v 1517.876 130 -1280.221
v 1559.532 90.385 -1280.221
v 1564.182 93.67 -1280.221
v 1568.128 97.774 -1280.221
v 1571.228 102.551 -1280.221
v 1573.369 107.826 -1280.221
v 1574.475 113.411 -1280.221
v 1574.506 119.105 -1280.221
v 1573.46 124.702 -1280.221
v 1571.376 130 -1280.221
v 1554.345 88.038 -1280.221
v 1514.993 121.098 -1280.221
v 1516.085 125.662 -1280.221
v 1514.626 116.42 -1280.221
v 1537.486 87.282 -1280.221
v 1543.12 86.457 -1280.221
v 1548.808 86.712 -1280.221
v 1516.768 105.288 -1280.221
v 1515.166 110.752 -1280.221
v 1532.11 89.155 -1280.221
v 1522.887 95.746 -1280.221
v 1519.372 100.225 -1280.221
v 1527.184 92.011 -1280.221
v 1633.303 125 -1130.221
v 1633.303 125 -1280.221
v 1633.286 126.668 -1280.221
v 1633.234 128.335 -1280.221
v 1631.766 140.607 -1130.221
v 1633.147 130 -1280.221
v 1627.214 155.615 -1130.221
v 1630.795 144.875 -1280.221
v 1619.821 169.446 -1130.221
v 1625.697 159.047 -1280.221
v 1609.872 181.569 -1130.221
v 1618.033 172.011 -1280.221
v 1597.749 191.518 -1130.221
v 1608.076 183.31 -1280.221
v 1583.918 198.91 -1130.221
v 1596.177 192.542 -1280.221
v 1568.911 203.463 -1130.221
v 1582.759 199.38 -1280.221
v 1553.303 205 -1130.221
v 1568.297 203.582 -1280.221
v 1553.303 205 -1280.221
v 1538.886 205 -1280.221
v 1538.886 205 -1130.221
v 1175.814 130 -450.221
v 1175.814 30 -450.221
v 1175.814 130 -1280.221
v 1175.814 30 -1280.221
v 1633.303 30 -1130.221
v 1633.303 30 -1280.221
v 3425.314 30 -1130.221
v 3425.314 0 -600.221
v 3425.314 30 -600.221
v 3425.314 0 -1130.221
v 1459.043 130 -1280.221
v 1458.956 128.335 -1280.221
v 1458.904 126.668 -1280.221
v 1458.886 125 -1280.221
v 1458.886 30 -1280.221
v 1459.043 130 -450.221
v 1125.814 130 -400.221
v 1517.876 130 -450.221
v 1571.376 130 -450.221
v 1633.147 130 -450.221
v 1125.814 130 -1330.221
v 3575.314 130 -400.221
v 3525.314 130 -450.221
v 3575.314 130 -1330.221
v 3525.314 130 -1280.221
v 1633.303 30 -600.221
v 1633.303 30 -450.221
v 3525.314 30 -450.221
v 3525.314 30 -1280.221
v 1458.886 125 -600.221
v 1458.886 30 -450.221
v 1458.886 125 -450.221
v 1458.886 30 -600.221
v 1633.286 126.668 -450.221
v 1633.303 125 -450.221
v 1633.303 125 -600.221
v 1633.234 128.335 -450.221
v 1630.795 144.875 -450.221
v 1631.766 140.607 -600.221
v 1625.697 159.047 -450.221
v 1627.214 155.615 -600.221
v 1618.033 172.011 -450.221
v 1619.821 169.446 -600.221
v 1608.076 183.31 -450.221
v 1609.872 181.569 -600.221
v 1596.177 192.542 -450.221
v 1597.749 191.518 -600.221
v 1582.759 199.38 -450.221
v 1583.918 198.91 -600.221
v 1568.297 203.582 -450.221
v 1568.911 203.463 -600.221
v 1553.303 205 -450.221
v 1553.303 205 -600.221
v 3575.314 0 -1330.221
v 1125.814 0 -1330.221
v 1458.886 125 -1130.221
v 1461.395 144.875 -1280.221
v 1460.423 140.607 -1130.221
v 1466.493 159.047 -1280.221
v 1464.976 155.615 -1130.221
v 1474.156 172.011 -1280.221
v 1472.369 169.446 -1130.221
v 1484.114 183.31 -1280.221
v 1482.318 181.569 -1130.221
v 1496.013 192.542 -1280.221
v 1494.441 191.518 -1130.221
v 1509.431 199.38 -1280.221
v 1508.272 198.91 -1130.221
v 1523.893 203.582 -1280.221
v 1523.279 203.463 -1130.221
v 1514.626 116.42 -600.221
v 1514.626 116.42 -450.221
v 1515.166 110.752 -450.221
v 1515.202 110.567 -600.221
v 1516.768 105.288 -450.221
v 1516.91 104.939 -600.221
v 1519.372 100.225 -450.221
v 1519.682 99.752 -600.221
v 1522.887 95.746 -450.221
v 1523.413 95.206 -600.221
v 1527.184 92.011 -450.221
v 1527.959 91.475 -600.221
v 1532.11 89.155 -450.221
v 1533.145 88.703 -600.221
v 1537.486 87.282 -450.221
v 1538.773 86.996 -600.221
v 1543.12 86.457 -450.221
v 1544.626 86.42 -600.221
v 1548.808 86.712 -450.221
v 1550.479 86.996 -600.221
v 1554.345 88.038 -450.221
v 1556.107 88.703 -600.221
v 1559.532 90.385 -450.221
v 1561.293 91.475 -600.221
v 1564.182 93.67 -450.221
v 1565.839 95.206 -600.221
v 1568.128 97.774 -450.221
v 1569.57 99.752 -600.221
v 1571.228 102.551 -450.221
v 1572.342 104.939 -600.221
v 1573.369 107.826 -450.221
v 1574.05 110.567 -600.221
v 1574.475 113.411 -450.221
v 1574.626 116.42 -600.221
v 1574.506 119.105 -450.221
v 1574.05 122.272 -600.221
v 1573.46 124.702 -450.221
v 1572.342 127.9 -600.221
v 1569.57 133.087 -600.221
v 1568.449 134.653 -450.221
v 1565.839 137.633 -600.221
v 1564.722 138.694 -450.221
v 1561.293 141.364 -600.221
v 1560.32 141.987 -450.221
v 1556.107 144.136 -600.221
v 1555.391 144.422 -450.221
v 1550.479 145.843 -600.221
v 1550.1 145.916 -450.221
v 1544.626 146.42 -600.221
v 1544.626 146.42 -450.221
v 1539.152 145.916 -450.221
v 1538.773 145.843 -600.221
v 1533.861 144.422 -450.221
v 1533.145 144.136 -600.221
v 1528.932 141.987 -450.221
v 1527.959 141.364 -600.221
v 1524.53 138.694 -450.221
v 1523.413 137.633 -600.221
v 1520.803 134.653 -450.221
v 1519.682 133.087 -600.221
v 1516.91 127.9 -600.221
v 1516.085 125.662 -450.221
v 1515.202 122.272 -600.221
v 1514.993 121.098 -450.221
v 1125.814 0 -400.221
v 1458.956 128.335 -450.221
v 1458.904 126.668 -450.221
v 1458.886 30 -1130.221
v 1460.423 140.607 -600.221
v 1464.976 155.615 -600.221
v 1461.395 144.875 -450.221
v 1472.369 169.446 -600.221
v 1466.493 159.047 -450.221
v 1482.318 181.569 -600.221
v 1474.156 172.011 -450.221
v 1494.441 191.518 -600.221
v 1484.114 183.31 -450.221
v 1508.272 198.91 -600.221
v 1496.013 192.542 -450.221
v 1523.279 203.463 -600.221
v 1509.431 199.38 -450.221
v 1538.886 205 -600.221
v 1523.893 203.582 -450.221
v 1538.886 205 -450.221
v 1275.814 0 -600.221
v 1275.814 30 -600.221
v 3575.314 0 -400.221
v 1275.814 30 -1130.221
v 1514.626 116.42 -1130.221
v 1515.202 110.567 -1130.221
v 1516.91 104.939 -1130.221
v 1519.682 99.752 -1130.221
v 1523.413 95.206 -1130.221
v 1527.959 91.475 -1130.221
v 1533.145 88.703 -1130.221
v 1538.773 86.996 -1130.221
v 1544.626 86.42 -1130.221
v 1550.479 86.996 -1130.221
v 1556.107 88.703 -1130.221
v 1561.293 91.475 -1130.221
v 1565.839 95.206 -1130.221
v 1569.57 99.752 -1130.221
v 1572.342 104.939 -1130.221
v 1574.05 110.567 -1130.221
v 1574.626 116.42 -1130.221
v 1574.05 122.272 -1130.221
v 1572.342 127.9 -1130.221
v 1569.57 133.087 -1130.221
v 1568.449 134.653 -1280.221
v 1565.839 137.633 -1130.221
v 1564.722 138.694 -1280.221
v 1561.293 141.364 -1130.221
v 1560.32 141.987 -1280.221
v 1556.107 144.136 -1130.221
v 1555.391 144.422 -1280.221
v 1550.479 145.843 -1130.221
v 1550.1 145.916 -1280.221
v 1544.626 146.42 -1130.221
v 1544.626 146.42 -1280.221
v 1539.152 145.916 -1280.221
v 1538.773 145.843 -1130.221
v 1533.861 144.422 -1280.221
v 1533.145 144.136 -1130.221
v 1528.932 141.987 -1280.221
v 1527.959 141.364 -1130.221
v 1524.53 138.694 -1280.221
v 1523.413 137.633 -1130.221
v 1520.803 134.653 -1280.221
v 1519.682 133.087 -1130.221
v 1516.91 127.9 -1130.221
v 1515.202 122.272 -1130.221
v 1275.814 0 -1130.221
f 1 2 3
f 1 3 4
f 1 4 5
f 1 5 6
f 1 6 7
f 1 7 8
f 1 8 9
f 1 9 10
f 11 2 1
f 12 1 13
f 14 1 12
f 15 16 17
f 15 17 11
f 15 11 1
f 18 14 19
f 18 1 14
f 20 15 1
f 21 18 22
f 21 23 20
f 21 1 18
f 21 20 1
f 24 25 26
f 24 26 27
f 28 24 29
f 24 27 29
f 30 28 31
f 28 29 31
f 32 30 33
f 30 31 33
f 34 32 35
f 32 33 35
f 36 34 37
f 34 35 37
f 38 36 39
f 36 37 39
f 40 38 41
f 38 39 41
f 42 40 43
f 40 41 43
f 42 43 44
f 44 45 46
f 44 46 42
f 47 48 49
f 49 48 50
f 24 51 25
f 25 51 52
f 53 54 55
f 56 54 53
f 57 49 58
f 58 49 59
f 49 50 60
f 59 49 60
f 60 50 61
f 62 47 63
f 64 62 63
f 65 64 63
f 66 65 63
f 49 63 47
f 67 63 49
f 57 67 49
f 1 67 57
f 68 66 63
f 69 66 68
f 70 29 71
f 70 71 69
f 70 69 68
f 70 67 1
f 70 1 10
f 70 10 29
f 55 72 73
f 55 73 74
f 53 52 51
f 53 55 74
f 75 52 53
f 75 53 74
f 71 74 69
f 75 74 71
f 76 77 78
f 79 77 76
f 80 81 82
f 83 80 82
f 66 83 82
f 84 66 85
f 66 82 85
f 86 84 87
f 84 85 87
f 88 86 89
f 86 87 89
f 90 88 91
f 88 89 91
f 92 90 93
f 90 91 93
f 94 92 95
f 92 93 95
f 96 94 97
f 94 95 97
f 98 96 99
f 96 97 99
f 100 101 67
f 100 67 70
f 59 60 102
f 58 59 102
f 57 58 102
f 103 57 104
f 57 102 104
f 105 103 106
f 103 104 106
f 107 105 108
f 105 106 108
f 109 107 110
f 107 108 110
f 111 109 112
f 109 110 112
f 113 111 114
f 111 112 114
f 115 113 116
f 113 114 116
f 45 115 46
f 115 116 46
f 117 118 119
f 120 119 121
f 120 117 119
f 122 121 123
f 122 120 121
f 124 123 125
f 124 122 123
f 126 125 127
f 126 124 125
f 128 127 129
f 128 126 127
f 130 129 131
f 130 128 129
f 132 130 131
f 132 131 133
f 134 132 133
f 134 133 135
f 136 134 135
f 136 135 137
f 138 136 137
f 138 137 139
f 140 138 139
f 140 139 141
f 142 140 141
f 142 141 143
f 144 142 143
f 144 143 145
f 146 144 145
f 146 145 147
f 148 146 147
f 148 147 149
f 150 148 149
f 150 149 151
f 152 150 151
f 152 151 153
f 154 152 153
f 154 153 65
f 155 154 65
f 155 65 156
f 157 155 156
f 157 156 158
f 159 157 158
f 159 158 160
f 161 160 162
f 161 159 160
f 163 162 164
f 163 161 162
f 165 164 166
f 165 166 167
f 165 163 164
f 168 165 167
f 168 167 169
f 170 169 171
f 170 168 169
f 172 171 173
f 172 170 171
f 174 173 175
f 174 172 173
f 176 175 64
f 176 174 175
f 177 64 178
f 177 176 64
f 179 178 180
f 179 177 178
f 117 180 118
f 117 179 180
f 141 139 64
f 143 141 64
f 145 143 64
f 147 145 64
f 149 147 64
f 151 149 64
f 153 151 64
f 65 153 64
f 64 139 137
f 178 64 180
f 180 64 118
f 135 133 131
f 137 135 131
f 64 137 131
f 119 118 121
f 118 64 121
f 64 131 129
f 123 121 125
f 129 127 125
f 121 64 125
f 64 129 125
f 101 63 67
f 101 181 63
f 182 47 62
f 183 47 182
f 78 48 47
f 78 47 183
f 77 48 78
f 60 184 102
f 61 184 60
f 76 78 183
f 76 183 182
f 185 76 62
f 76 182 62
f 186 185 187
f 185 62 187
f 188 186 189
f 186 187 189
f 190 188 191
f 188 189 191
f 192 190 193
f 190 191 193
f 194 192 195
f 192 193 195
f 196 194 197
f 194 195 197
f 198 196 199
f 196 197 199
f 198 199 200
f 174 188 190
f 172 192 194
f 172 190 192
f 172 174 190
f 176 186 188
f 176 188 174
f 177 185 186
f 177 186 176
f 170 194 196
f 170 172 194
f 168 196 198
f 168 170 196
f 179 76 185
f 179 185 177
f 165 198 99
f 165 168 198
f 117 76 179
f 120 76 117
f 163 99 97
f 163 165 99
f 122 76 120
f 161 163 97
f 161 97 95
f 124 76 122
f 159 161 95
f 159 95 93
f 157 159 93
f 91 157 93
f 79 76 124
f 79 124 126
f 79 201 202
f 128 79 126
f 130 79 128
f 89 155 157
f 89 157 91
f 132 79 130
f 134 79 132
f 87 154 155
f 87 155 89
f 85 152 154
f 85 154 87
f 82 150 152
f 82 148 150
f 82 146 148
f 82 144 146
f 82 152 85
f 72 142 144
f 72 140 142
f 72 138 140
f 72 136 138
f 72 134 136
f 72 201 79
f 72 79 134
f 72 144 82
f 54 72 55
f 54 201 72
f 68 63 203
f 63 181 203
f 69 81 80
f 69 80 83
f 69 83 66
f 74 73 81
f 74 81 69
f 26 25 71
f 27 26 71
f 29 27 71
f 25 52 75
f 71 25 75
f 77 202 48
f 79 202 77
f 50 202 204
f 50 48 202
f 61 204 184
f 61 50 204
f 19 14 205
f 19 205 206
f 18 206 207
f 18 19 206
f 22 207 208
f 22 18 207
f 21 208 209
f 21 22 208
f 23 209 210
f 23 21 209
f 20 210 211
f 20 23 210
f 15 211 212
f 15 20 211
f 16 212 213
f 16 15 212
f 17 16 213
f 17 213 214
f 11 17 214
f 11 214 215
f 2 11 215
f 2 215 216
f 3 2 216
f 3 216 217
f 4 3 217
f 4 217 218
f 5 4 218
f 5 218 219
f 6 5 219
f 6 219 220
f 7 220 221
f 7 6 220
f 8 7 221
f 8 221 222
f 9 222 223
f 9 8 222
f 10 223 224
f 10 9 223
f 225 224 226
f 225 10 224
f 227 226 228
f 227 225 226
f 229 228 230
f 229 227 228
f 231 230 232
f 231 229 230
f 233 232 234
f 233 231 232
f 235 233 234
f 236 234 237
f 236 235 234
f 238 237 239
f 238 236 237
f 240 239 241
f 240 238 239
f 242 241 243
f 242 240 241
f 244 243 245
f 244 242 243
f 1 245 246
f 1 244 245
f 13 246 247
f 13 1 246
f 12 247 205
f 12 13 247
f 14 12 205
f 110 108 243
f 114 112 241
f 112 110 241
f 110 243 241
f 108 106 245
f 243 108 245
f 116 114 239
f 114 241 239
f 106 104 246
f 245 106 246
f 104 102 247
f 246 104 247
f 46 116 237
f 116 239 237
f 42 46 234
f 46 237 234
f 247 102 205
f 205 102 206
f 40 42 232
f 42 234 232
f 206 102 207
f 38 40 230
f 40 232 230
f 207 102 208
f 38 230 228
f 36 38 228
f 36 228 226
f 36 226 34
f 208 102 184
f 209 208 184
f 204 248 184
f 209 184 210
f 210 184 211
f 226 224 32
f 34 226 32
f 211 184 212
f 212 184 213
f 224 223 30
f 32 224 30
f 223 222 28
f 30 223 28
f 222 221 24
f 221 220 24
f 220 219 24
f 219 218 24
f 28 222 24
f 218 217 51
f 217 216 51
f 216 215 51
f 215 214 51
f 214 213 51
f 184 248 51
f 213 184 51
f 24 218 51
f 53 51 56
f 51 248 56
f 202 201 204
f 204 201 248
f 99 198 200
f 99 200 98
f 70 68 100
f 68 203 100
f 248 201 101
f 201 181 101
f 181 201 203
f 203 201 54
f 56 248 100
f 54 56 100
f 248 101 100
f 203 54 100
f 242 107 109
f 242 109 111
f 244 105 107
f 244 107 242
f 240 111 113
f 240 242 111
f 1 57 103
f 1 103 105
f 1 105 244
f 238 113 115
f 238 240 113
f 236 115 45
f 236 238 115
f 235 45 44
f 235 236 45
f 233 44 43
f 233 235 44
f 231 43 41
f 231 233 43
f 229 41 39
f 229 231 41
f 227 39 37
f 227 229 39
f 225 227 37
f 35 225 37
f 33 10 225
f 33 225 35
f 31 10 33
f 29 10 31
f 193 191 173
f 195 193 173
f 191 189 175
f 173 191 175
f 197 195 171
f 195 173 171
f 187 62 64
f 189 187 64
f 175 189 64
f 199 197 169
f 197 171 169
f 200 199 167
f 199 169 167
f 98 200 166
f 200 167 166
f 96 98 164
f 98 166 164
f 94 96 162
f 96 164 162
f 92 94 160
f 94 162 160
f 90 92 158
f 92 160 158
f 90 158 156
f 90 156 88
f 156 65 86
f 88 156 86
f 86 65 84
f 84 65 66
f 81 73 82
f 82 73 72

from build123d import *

# Parameters (mm, degrees)
SKETCH4_W               = 2449.5
SKETCH4_H               = 930
SKETCH4_W_2             = 2149.5
SKETCH4_H_2             = 530
BOSS_EXTRUDE2_DEPTH     = 30
SKETCH6_W               = 2449.5
SKETCH6_H               = 930
SKETCH6_W_2             = 2349.5
SKETCH6_H_2             = 830
BOSS_EXTRUDE3_DEPTH     = 100
SKETCH8_W               = 174.417097876
SKETCH8_H               = 150
BOSS_EXTRUDE4_DEPTH     = 175
CUT_EXTRUDE1_DEPTH      = 680
CUT_EXTRUDE1_DEPTH_BACK = 150
SKETCH10_R              = 30
FILLET1_R               = 80


with BuildPart() as part:
    # Sketch4 → Boss-Extrude2 (new body)
    with BuildSketch(Plane(origin=(0, 0, 0), x_dir=(1, 0, 0), z_dir=(0, 1, 0))):
        with Locations((2350.564429087, 865.22075714)):
            Rectangle(SKETCH4_W, SKETCH4_H)
        with Locations((2350.564429087, 865.22075714)):
            Rectangle(SKETCH4_W_2, SKETCH4_H_2, mode=Mode.SUBTRACT)
    extrude(amount=BOSS_EXTRUDE2_DEPTH)

    # Sketch6 → Boss-Extrude3 (add)
    with BuildSketch(Plane(origin=(0, 30, 0), x_dir=(1, 0, 0), z_dir=(0, 1, 0))):
        with Locations((2350.564429087, 865.22075714)):
            Rectangle(SKETCH6_W, SKETCH6_H)
        with Locations((2350.564429087, 865.22075714)):
            Rectangle(SKETCH6_W_2, SKETCH6_H_2, mode=Mode.SUBTRACT)
    extrude(amount=BOSS_EXTRUDE3_DEPTH)

    # Sketch8 → Boss-Extrude4 (add)
    with BuildSketch(Plane(origin=(0, 30, 0), x_dir=(1, 0, 0), z_dir=(0, 1, 0))):
        with Locations((1546.094821657, 1205.22075714)):
            Rectangle(SKETCH8_W, SKETCH8_H)
        with Locations((1546.094821657, 525.22075714)):
            Rectangle(SKETCH8_W, SKETCH8_H)
    extrude(amount=BOSS_EXTRUDE4_DEPTH)

    # Sketch10 → Cut-Extrude1 (cut, two sides: drawn at the far end of the back side and taken through both)
    with BuildSketch(Plane.XY.offset(-1130.22075714).offset(-CUT_EXTRUDE1_DEPTH_BACK)):
        with Locations(Location((1544.625999864, 116.419579706, 0), (0, 0, 180))):
            Circle(SKETCH10_R)
    extrude(amount=CUT_EXTRUDE1_DEPTH + CUT_EXTRUDE1_DEPTH_BACK, mode=Mode.SUBTRACT)

    # Fillet1
    # the kernel refuses this fillet: 80 mm, written as the material it takes off along each edge
    with BuildSketch(Plane(origin=(1633.303370595, 205, -1280.22075714), x_dir=(0, -1, 0), z_dir=(0, 0, 1)), Plane(origin=(1458.886272719, 205, -450.22075714), x_dir=(0, -1, 0), z_dir=(0, 0, -1))) as fillet1_piece_1:
        with BuildLine():
            CenterArc((FILLET1_R, -FILLET1_R), FILLET1_R, 90, 90)
            Line((0, -FILLET1_R), (0, 0))
            Line((0, 0), (FILLET1_R, 0))
        make_face()
    extrude(amount=350, mode=Mode.SUBTRACT)
    with BuildSketch(Plane(origin=(1458.886272719, 205, -930.22075714), x_dir=(1, 0, 0), z_dir=(0, 0, -1)), Plane(origin=(1633.303370595, 205, -800.22075714), x_dir=(-1, 0, 0), z_dir=(0, 0, 1))) as fillet1_piece_2:
        with BuildLine():
            CenterArc((FILLET1_R, FILLET1_R), FILLET1_R, 180, 90)
            Line((0, FILLET1_R), (0, 0))
            Line((0, 0), (FILLET1_R, 0))
        make_face()
    extrude(amount=350, mode=Mode.SUBTRACT)


solid = part.part
